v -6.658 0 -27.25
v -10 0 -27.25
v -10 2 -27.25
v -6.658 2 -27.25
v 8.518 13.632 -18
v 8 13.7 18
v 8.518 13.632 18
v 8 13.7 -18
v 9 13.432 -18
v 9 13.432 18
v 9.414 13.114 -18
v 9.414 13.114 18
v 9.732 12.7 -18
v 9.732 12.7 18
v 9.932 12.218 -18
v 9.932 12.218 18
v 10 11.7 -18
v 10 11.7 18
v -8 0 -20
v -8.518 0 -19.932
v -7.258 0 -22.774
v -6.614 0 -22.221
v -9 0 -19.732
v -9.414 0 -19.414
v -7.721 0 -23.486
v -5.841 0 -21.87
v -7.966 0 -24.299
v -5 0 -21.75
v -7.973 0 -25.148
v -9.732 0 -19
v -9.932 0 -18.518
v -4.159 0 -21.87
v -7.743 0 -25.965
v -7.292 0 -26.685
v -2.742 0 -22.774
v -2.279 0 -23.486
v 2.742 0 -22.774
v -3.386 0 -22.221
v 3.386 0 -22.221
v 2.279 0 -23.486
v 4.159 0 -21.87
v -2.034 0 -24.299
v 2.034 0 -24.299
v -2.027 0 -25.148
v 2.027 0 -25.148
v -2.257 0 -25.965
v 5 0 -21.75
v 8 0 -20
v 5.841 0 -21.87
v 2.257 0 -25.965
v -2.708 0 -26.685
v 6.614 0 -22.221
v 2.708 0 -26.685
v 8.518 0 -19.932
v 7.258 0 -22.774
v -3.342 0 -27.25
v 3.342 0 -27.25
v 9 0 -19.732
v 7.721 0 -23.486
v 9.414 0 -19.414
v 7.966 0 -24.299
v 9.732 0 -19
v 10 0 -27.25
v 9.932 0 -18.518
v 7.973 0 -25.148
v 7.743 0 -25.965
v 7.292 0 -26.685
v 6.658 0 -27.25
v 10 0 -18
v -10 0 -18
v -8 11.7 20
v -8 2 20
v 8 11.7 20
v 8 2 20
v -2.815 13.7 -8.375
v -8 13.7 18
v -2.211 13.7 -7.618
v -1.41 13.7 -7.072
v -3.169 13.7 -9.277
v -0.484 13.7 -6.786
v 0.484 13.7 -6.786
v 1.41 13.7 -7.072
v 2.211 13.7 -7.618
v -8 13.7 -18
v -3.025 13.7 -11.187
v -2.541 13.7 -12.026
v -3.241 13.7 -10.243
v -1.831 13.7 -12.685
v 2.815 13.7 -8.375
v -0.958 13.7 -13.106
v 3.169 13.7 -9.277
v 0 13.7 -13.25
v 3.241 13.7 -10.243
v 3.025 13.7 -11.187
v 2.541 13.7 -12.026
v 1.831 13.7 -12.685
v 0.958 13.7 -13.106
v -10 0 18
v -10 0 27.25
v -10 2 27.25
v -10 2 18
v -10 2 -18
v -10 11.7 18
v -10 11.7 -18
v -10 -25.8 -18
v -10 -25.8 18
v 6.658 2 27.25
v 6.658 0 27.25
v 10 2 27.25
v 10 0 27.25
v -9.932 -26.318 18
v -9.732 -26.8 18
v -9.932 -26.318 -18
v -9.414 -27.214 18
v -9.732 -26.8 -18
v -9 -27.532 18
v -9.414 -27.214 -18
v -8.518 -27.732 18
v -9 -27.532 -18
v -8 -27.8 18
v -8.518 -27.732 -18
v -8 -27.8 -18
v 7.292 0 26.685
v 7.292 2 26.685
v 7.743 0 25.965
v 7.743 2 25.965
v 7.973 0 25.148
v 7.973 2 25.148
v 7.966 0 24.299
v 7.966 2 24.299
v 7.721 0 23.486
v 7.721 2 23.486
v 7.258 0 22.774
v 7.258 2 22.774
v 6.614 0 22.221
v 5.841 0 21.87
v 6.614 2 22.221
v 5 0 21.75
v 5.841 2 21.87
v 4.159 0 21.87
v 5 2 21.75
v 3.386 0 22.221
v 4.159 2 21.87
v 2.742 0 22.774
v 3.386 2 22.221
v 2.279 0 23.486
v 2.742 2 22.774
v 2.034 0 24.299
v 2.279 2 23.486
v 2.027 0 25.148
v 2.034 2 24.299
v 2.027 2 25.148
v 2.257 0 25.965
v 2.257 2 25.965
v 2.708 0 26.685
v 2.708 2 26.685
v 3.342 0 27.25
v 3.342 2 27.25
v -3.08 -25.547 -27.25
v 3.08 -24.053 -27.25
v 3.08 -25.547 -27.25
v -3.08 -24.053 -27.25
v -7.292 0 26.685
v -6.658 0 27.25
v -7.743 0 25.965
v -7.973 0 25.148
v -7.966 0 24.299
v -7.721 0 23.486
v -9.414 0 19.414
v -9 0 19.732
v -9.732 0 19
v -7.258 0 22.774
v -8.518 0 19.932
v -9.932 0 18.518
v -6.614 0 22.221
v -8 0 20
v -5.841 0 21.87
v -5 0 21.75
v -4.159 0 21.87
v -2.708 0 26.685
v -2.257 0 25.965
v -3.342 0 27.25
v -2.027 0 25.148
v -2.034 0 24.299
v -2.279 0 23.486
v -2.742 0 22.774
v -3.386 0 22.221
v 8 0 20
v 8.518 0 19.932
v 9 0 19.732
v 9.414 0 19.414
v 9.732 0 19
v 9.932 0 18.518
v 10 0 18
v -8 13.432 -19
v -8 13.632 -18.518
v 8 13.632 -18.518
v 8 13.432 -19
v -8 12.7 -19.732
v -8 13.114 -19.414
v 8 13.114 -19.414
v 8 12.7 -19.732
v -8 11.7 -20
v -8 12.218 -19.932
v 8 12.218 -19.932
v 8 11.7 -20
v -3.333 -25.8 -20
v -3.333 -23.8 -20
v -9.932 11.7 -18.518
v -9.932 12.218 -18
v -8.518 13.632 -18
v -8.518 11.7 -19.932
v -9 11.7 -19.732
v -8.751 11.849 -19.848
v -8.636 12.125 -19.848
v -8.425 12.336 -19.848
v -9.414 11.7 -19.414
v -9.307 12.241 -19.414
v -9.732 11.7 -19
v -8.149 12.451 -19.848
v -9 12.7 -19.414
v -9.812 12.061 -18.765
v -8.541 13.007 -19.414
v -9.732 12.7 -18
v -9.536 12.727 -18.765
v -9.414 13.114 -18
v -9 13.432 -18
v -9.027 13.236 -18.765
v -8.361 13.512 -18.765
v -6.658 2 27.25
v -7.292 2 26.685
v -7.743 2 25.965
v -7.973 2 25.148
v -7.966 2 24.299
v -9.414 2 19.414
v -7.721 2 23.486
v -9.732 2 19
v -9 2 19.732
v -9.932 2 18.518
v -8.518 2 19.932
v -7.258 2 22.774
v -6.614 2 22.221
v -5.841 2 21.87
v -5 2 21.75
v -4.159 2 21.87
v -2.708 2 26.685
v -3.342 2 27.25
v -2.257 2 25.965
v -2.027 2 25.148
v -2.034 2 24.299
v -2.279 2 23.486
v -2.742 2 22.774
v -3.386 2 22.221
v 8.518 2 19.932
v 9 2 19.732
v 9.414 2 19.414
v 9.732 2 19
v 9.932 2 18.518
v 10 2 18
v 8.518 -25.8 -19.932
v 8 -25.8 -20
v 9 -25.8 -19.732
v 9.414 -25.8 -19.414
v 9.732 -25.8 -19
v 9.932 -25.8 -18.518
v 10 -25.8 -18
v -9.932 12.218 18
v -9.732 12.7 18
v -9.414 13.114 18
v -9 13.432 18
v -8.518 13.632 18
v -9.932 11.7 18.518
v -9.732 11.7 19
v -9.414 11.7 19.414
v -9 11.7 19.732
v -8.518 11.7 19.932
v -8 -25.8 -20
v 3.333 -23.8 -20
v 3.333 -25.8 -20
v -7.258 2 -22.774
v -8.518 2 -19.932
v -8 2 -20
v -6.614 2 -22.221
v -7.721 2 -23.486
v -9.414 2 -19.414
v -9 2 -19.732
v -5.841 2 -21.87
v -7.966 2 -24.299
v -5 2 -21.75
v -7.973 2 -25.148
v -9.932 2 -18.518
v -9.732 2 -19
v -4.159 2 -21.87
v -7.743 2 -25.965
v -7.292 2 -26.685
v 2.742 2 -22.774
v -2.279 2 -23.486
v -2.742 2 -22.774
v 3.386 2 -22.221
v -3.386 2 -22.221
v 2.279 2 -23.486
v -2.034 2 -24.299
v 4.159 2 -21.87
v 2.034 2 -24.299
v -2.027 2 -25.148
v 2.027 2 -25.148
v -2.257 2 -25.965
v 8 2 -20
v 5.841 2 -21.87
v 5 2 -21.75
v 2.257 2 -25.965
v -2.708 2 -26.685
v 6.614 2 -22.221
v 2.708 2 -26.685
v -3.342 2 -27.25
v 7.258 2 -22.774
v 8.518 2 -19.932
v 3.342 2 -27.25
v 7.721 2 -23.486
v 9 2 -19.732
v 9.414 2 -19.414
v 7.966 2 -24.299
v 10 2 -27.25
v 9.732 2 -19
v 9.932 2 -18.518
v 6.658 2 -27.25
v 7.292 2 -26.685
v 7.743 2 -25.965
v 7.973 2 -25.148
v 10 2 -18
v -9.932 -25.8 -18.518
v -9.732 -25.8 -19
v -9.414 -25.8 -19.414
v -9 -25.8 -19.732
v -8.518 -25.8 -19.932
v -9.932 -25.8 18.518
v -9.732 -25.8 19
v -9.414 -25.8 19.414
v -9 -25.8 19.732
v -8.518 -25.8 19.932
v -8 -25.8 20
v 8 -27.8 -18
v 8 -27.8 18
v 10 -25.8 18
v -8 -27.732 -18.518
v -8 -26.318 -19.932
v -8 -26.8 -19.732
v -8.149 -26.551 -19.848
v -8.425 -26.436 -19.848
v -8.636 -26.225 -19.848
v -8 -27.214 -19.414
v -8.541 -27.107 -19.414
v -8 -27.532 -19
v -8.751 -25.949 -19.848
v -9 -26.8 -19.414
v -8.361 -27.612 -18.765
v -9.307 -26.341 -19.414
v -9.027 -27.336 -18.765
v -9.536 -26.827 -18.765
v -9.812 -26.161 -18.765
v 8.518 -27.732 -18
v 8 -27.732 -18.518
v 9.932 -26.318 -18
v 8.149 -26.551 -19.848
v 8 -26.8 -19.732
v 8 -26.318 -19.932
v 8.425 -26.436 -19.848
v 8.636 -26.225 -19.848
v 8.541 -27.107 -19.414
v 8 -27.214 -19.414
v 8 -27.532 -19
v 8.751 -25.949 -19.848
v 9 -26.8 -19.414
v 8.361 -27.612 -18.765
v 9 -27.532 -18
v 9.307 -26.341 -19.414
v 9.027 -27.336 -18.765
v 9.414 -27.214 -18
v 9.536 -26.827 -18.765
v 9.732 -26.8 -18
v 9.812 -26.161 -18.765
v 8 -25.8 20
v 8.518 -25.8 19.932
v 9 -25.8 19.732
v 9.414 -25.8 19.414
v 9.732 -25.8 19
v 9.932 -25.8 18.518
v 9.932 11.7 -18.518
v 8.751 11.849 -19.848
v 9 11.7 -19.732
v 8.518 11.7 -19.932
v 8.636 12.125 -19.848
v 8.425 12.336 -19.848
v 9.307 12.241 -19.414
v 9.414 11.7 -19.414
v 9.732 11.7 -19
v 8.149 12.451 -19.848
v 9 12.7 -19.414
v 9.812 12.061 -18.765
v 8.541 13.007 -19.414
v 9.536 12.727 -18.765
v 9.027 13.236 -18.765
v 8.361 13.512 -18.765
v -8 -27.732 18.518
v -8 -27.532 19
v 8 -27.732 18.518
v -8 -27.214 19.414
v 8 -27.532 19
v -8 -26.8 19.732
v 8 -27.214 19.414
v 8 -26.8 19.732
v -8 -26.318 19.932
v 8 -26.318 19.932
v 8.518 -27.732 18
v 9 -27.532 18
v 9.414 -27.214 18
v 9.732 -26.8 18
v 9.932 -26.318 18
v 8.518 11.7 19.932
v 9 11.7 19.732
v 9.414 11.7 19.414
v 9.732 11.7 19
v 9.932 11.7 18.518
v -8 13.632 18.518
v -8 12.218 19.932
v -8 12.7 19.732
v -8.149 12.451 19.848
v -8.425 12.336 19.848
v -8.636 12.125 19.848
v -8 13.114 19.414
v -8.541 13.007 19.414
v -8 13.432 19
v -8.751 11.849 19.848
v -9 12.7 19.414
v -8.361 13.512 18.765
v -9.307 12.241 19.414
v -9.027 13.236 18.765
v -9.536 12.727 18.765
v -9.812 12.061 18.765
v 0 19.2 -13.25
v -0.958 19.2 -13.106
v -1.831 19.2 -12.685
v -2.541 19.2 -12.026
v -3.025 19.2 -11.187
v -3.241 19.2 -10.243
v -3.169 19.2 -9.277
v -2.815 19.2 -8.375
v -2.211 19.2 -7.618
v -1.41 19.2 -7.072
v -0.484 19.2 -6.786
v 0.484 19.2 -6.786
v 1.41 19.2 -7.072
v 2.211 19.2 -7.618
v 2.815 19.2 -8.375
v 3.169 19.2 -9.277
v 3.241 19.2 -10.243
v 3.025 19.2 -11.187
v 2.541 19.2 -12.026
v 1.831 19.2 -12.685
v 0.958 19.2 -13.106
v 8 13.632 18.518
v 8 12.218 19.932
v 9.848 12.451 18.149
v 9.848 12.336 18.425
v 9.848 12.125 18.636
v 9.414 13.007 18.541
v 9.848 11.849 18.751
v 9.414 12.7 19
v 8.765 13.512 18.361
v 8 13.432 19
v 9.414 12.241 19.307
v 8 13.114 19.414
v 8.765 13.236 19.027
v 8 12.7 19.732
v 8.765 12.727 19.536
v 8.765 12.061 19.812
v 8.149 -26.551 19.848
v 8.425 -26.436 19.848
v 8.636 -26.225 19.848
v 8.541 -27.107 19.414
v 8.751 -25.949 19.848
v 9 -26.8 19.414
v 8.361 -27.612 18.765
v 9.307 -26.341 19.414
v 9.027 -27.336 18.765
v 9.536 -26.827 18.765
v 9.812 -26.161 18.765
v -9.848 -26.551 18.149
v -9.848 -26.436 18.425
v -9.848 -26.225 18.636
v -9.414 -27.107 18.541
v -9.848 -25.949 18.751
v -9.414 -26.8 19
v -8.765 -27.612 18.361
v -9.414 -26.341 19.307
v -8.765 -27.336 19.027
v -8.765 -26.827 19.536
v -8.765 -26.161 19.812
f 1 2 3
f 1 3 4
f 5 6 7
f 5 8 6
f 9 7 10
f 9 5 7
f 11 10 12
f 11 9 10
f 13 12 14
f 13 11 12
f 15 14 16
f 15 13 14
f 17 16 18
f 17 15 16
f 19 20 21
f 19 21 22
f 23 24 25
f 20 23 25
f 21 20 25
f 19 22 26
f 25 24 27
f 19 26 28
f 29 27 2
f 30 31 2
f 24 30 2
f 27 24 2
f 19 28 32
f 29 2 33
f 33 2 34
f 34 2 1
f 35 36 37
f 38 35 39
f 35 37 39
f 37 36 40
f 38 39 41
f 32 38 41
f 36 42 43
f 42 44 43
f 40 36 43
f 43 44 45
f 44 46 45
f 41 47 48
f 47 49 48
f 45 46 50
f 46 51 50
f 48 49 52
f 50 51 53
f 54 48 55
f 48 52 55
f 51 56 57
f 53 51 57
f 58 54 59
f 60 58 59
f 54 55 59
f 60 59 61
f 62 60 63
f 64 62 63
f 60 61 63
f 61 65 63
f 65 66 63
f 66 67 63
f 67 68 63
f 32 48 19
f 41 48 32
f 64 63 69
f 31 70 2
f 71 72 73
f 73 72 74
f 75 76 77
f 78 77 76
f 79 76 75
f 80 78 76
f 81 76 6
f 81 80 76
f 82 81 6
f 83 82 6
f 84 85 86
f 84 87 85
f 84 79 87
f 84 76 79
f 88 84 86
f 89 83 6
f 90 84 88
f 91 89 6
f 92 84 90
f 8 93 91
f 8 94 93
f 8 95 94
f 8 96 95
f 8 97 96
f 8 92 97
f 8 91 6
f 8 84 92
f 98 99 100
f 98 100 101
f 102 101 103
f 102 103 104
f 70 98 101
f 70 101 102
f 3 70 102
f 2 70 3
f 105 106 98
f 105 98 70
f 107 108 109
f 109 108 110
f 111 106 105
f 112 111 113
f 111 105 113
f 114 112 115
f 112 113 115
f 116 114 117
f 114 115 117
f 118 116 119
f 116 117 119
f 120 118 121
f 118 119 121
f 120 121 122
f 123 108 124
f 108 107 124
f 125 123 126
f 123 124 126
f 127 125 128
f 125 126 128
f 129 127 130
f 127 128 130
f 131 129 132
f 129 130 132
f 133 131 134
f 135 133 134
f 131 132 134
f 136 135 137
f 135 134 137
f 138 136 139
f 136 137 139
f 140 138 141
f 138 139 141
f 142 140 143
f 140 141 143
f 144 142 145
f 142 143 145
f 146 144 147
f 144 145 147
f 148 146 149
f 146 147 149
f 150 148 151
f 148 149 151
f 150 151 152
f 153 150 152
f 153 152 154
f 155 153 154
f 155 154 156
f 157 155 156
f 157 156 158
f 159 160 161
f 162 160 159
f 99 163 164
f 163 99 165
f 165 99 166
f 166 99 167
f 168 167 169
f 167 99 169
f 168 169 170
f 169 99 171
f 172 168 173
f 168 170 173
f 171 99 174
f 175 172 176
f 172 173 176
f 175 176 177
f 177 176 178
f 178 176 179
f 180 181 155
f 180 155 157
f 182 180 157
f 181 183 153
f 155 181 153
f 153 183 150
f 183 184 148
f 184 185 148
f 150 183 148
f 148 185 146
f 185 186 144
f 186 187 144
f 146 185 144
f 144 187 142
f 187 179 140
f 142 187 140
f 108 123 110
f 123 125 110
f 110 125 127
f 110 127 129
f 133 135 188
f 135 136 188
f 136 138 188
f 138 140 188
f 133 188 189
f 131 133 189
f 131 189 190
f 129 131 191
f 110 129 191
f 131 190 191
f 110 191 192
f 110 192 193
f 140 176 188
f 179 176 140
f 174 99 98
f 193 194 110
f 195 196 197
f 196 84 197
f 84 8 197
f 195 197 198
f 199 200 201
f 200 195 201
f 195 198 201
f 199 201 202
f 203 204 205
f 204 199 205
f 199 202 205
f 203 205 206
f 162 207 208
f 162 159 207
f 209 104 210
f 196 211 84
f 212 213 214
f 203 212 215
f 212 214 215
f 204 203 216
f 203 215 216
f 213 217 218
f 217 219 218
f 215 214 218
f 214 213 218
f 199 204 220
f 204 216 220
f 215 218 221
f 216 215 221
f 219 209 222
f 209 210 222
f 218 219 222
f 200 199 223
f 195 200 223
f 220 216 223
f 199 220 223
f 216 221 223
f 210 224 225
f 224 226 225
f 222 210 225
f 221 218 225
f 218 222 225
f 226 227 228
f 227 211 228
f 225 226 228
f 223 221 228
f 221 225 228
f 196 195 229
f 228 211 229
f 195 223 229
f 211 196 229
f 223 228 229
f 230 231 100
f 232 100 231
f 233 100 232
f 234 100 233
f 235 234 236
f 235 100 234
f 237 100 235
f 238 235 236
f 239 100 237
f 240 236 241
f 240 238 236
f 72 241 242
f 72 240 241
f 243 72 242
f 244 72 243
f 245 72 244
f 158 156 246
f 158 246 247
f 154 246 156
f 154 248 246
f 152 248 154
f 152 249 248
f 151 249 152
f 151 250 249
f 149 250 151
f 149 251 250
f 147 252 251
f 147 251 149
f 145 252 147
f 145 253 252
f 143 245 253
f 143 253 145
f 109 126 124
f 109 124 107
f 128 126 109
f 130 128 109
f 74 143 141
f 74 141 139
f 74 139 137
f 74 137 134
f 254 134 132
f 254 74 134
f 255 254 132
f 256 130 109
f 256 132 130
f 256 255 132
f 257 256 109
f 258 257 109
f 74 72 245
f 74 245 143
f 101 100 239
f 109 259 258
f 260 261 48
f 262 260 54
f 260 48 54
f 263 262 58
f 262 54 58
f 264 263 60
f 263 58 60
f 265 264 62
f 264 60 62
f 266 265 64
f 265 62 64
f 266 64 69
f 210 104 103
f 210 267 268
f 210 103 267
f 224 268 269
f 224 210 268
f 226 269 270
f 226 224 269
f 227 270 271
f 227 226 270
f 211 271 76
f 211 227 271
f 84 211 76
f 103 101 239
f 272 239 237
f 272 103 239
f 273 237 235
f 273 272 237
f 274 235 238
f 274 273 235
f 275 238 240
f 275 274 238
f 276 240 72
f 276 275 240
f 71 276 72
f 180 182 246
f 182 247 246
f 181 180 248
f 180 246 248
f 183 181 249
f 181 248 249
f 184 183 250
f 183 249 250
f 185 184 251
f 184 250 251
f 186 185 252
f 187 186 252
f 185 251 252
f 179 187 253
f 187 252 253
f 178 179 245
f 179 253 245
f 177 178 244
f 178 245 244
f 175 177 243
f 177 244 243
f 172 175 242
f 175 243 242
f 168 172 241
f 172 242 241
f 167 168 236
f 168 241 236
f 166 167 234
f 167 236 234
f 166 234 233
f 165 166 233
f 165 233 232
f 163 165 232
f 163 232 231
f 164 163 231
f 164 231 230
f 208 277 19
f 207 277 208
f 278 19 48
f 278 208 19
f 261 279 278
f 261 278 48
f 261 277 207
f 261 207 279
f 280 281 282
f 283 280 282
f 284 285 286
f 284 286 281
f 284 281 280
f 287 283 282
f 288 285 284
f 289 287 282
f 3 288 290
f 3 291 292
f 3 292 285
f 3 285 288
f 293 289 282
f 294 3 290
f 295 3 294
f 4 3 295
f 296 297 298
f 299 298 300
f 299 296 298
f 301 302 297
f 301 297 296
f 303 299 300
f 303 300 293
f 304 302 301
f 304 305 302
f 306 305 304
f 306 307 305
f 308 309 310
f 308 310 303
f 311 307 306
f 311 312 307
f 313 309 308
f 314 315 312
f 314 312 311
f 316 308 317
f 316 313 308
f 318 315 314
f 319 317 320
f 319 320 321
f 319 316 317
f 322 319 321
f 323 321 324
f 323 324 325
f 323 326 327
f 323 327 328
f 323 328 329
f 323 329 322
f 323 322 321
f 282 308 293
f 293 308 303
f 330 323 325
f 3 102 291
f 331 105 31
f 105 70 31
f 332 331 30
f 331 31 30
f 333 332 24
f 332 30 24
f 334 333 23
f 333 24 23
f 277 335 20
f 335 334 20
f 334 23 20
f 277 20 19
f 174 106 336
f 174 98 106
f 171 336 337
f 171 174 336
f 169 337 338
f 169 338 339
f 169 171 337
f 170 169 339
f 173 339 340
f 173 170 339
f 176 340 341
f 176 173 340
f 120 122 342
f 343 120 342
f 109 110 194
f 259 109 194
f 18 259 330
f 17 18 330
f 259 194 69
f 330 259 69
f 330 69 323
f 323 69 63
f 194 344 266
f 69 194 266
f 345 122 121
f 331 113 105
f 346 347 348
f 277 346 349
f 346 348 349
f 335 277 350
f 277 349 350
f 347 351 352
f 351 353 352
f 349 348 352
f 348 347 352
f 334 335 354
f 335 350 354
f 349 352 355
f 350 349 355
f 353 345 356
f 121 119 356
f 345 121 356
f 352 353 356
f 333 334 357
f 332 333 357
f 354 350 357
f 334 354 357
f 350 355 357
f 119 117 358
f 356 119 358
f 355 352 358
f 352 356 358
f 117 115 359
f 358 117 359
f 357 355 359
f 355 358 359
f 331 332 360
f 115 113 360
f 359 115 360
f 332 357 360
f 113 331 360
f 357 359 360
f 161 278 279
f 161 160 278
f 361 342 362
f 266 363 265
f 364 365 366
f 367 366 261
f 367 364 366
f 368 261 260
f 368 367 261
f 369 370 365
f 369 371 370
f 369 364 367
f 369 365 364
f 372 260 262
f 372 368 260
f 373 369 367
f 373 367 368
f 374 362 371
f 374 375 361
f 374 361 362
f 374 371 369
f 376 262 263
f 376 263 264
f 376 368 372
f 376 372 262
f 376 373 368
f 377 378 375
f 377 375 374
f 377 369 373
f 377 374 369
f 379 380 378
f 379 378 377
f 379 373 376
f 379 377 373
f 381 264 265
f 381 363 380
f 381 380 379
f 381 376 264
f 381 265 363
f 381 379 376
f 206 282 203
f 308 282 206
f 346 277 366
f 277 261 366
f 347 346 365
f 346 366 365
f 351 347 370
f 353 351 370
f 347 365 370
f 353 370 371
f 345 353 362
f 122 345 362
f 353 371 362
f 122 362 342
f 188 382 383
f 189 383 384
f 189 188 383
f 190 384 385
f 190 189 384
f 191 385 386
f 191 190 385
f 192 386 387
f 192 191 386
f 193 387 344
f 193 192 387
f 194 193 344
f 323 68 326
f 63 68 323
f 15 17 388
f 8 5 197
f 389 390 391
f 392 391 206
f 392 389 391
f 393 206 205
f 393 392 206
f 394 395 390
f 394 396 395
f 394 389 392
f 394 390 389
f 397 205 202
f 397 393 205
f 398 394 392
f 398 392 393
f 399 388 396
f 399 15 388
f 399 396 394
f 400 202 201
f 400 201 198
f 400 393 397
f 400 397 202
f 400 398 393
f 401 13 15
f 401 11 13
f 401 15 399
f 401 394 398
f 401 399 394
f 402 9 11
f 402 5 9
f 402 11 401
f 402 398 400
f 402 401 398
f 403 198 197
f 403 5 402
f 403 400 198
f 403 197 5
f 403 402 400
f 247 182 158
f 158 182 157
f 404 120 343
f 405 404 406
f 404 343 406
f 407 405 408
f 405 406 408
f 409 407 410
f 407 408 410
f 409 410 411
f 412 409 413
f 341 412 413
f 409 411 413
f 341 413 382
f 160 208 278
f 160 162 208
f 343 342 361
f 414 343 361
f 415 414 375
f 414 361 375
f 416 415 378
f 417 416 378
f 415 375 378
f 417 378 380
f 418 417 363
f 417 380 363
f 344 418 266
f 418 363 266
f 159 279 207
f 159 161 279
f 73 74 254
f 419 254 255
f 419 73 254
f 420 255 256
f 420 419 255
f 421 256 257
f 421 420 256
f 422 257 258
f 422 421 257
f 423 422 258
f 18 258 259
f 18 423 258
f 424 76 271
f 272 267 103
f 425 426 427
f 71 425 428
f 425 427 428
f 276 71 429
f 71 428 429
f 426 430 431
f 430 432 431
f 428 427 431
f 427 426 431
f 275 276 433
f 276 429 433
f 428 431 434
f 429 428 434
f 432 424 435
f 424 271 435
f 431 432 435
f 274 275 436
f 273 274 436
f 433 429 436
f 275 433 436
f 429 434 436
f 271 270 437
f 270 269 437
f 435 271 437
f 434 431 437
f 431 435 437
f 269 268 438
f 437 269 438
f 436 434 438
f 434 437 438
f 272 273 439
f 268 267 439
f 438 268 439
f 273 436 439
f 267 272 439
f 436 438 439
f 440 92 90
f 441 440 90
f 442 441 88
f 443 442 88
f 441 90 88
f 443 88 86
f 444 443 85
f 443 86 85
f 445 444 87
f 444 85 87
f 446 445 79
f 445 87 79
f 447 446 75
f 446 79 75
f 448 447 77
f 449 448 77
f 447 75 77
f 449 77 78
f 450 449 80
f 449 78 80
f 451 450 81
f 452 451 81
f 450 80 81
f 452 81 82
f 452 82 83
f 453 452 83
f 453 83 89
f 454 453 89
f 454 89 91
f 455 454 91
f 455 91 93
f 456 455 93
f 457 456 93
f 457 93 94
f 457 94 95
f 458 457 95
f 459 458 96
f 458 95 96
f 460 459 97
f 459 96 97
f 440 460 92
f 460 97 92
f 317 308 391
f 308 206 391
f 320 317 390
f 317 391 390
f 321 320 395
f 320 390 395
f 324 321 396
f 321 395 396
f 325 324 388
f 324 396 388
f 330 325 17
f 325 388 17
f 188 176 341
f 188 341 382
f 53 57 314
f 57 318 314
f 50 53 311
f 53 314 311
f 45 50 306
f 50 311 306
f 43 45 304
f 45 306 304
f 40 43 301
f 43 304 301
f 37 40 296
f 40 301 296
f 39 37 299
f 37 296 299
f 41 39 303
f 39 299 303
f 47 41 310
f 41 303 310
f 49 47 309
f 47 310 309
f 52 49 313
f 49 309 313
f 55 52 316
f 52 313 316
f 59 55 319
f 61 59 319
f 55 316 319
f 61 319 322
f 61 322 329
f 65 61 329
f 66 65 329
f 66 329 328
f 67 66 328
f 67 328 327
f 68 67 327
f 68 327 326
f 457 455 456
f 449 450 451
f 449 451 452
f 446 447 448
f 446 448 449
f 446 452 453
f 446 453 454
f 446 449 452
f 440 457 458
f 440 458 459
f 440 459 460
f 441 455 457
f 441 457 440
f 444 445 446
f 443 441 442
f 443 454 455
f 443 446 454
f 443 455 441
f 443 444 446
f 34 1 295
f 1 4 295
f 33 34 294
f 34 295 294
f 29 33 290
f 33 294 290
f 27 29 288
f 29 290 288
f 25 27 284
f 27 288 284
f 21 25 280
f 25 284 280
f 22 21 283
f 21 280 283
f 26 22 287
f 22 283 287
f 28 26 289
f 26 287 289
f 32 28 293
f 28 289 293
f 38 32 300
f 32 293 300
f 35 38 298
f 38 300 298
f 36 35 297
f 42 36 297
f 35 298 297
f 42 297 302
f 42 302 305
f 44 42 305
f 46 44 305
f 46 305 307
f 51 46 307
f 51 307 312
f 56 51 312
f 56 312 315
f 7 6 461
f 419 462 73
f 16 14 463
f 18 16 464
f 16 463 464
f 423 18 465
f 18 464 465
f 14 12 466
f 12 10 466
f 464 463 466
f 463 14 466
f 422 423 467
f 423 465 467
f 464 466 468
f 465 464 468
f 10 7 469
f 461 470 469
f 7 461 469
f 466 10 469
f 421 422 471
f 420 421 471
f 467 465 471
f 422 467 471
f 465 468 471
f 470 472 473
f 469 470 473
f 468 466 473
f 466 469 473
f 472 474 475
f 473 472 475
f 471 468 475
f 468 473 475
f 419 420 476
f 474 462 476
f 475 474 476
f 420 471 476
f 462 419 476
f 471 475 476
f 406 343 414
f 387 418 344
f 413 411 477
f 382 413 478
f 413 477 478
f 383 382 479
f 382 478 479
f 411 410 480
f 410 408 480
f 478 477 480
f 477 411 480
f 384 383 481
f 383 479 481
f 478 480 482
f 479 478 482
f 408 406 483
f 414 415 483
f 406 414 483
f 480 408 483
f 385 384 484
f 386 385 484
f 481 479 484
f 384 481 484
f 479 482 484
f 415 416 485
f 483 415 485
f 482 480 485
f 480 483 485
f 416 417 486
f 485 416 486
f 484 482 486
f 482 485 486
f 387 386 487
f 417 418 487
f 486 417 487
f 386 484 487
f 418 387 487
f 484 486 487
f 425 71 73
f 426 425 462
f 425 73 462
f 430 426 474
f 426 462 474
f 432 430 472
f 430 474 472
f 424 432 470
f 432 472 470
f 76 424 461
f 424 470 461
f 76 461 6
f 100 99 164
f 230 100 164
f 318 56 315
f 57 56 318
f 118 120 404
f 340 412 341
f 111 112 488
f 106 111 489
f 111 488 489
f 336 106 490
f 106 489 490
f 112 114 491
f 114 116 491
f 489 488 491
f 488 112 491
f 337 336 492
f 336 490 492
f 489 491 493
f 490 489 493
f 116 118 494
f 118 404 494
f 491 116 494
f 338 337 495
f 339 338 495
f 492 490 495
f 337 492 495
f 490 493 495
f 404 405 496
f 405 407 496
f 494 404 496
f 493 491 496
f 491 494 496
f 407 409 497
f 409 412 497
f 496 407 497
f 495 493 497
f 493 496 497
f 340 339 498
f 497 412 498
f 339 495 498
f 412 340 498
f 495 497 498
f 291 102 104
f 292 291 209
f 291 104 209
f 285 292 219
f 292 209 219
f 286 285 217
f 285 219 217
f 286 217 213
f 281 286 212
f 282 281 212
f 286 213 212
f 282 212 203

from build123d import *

# Parameters (mm, degrees)
BOSS_EXTRUDE1_DEPTH      = 13.7
BOSS_EXTRUDE1_DEPTH_BACK = 27.8
SKETCH1_W                = 20
SKETCH1_H                = 40
SKETCH4_W                = 20
SKETCH4_H                = 54.5
BOSS_EXTRUDE2_DEPTH      = 2
SKETCH5_R                = 3
CUT_EXTRUDE1_DEPTH       = 42.600510814
SKETCH6_R                = 3.25
BOSS_EXTRUDE3_DEPTH      = 5.5
SKETCH7_W                = 6.666666666
SKETCH7_H                = 2
BOSS_EXTRUDE4_DEPTH      = 7.25
BOSS_EXTRUDE4_TAPER      = 2
FILLET1_R                = 2


with BuildPart() as part:
    # Sketch1 → Boss-Extrude1 (new, two sides: drawn at the far end of the back side and taken through both)
    with BuildSketch(Plane(origin=(0, 0, 0), x_dir=(1, 0, 0), z_dir=(0, 1, 0)).offset(-BOSS_EXTRUDE1_DEPTH_BACK)):
        Rectangle(SKETCH1_W, SKETCH1_H)
    extrude(amount=BOSS_EXTRUDE1_DEPTH + BOSS_EXTRUDE1_DEPTH_BACK)

    # Sketch4 → Boss-Extrude2 (add)
    with BuildSketch(Plane(origin=(0, 0, 0), x_dir=(1, 0, 0), z_dir=(0, 1, 0))):
        Rectangle(SKETCH4_W, SKETCH4_H)
    extrude(amount=BOSS_EXTRUDE2_DEPTH)

    # Sketch5 → Cut-Extrude1 (cut, through all)
    with BuildSketch(Plane(origin=(0, 2, 0), x_dir=(1, 0, 0), z_dir=(0, 1, 0))):
        with Locations((-5, 24.75)):
            Circle(SKETCH5_R)
        with Locations((5, 24.75)):
            Circle(SKETCH5_R)
        with Locations((-5, -24.75)):
            Circle(SKETCH5_R)
        with Locations((5, -24.75)):
            Circle(SKETCH5_R)
    extrude(amount=-CUT_EXTRUDE1_DEPTH, mode=Mode.SUBTRACT)

    # Sketch6 → Boss-Extrude3 (add)
    with BuildSketch(Plane(origin=(0, 13.7, 0), x_dir=(1, 0, 0), z_dir=(0, 1, 0))):
        with Locations(Location((0, 10, 0), (0, 0, 90))):
            Circle(SKETCH6_R)
    extrude(amount=BOSS_EXTRUDE3_DEPTH)

    # Sketch7 → Boss-Extrude4 (add)
    with BuildSketch(Plane(origin=(0, 0, -20), x_dir=(-1, 0, 0), z_dir=(0, 0, -1))):
        with Locations((0, -24.8)):
            Rectangle(SKETCH7_W, SKETCH7_H)
    extrude(amount=BOSS_EXTRUDE4_DEPTH, taper=BOSS_EXTRUDE4_TAPER)

    # Fillet1
    fillet1_edges = [part.edges().sort_by_distance(p)[0] for p in [
        (10, -27.8, 0),
        (0, -27.8, 20),
        (-10, -27.8, 0),
        (0, -27.8, -20),
        (-10, 13.7, 0),
        (0, 13.7, 20),
        (-10, -13.9, 20),
        (10, -13.9, 20),
        (-10, -13.9, -20),
        (10, -13.9, -20),
        (10, 13.7, 0),
        (10, 7.85, 20),
        (-10, 7.85, 20),
        (-10, 7.85, -20),
        (10, 7.85, -20),
        (0, 13.7, -20),
    ]]
    fillet(fillet1_edges, radius=FILLET1_R - 0.0001)  # a hair under: the kernel refuses the full size


solid = part.part
